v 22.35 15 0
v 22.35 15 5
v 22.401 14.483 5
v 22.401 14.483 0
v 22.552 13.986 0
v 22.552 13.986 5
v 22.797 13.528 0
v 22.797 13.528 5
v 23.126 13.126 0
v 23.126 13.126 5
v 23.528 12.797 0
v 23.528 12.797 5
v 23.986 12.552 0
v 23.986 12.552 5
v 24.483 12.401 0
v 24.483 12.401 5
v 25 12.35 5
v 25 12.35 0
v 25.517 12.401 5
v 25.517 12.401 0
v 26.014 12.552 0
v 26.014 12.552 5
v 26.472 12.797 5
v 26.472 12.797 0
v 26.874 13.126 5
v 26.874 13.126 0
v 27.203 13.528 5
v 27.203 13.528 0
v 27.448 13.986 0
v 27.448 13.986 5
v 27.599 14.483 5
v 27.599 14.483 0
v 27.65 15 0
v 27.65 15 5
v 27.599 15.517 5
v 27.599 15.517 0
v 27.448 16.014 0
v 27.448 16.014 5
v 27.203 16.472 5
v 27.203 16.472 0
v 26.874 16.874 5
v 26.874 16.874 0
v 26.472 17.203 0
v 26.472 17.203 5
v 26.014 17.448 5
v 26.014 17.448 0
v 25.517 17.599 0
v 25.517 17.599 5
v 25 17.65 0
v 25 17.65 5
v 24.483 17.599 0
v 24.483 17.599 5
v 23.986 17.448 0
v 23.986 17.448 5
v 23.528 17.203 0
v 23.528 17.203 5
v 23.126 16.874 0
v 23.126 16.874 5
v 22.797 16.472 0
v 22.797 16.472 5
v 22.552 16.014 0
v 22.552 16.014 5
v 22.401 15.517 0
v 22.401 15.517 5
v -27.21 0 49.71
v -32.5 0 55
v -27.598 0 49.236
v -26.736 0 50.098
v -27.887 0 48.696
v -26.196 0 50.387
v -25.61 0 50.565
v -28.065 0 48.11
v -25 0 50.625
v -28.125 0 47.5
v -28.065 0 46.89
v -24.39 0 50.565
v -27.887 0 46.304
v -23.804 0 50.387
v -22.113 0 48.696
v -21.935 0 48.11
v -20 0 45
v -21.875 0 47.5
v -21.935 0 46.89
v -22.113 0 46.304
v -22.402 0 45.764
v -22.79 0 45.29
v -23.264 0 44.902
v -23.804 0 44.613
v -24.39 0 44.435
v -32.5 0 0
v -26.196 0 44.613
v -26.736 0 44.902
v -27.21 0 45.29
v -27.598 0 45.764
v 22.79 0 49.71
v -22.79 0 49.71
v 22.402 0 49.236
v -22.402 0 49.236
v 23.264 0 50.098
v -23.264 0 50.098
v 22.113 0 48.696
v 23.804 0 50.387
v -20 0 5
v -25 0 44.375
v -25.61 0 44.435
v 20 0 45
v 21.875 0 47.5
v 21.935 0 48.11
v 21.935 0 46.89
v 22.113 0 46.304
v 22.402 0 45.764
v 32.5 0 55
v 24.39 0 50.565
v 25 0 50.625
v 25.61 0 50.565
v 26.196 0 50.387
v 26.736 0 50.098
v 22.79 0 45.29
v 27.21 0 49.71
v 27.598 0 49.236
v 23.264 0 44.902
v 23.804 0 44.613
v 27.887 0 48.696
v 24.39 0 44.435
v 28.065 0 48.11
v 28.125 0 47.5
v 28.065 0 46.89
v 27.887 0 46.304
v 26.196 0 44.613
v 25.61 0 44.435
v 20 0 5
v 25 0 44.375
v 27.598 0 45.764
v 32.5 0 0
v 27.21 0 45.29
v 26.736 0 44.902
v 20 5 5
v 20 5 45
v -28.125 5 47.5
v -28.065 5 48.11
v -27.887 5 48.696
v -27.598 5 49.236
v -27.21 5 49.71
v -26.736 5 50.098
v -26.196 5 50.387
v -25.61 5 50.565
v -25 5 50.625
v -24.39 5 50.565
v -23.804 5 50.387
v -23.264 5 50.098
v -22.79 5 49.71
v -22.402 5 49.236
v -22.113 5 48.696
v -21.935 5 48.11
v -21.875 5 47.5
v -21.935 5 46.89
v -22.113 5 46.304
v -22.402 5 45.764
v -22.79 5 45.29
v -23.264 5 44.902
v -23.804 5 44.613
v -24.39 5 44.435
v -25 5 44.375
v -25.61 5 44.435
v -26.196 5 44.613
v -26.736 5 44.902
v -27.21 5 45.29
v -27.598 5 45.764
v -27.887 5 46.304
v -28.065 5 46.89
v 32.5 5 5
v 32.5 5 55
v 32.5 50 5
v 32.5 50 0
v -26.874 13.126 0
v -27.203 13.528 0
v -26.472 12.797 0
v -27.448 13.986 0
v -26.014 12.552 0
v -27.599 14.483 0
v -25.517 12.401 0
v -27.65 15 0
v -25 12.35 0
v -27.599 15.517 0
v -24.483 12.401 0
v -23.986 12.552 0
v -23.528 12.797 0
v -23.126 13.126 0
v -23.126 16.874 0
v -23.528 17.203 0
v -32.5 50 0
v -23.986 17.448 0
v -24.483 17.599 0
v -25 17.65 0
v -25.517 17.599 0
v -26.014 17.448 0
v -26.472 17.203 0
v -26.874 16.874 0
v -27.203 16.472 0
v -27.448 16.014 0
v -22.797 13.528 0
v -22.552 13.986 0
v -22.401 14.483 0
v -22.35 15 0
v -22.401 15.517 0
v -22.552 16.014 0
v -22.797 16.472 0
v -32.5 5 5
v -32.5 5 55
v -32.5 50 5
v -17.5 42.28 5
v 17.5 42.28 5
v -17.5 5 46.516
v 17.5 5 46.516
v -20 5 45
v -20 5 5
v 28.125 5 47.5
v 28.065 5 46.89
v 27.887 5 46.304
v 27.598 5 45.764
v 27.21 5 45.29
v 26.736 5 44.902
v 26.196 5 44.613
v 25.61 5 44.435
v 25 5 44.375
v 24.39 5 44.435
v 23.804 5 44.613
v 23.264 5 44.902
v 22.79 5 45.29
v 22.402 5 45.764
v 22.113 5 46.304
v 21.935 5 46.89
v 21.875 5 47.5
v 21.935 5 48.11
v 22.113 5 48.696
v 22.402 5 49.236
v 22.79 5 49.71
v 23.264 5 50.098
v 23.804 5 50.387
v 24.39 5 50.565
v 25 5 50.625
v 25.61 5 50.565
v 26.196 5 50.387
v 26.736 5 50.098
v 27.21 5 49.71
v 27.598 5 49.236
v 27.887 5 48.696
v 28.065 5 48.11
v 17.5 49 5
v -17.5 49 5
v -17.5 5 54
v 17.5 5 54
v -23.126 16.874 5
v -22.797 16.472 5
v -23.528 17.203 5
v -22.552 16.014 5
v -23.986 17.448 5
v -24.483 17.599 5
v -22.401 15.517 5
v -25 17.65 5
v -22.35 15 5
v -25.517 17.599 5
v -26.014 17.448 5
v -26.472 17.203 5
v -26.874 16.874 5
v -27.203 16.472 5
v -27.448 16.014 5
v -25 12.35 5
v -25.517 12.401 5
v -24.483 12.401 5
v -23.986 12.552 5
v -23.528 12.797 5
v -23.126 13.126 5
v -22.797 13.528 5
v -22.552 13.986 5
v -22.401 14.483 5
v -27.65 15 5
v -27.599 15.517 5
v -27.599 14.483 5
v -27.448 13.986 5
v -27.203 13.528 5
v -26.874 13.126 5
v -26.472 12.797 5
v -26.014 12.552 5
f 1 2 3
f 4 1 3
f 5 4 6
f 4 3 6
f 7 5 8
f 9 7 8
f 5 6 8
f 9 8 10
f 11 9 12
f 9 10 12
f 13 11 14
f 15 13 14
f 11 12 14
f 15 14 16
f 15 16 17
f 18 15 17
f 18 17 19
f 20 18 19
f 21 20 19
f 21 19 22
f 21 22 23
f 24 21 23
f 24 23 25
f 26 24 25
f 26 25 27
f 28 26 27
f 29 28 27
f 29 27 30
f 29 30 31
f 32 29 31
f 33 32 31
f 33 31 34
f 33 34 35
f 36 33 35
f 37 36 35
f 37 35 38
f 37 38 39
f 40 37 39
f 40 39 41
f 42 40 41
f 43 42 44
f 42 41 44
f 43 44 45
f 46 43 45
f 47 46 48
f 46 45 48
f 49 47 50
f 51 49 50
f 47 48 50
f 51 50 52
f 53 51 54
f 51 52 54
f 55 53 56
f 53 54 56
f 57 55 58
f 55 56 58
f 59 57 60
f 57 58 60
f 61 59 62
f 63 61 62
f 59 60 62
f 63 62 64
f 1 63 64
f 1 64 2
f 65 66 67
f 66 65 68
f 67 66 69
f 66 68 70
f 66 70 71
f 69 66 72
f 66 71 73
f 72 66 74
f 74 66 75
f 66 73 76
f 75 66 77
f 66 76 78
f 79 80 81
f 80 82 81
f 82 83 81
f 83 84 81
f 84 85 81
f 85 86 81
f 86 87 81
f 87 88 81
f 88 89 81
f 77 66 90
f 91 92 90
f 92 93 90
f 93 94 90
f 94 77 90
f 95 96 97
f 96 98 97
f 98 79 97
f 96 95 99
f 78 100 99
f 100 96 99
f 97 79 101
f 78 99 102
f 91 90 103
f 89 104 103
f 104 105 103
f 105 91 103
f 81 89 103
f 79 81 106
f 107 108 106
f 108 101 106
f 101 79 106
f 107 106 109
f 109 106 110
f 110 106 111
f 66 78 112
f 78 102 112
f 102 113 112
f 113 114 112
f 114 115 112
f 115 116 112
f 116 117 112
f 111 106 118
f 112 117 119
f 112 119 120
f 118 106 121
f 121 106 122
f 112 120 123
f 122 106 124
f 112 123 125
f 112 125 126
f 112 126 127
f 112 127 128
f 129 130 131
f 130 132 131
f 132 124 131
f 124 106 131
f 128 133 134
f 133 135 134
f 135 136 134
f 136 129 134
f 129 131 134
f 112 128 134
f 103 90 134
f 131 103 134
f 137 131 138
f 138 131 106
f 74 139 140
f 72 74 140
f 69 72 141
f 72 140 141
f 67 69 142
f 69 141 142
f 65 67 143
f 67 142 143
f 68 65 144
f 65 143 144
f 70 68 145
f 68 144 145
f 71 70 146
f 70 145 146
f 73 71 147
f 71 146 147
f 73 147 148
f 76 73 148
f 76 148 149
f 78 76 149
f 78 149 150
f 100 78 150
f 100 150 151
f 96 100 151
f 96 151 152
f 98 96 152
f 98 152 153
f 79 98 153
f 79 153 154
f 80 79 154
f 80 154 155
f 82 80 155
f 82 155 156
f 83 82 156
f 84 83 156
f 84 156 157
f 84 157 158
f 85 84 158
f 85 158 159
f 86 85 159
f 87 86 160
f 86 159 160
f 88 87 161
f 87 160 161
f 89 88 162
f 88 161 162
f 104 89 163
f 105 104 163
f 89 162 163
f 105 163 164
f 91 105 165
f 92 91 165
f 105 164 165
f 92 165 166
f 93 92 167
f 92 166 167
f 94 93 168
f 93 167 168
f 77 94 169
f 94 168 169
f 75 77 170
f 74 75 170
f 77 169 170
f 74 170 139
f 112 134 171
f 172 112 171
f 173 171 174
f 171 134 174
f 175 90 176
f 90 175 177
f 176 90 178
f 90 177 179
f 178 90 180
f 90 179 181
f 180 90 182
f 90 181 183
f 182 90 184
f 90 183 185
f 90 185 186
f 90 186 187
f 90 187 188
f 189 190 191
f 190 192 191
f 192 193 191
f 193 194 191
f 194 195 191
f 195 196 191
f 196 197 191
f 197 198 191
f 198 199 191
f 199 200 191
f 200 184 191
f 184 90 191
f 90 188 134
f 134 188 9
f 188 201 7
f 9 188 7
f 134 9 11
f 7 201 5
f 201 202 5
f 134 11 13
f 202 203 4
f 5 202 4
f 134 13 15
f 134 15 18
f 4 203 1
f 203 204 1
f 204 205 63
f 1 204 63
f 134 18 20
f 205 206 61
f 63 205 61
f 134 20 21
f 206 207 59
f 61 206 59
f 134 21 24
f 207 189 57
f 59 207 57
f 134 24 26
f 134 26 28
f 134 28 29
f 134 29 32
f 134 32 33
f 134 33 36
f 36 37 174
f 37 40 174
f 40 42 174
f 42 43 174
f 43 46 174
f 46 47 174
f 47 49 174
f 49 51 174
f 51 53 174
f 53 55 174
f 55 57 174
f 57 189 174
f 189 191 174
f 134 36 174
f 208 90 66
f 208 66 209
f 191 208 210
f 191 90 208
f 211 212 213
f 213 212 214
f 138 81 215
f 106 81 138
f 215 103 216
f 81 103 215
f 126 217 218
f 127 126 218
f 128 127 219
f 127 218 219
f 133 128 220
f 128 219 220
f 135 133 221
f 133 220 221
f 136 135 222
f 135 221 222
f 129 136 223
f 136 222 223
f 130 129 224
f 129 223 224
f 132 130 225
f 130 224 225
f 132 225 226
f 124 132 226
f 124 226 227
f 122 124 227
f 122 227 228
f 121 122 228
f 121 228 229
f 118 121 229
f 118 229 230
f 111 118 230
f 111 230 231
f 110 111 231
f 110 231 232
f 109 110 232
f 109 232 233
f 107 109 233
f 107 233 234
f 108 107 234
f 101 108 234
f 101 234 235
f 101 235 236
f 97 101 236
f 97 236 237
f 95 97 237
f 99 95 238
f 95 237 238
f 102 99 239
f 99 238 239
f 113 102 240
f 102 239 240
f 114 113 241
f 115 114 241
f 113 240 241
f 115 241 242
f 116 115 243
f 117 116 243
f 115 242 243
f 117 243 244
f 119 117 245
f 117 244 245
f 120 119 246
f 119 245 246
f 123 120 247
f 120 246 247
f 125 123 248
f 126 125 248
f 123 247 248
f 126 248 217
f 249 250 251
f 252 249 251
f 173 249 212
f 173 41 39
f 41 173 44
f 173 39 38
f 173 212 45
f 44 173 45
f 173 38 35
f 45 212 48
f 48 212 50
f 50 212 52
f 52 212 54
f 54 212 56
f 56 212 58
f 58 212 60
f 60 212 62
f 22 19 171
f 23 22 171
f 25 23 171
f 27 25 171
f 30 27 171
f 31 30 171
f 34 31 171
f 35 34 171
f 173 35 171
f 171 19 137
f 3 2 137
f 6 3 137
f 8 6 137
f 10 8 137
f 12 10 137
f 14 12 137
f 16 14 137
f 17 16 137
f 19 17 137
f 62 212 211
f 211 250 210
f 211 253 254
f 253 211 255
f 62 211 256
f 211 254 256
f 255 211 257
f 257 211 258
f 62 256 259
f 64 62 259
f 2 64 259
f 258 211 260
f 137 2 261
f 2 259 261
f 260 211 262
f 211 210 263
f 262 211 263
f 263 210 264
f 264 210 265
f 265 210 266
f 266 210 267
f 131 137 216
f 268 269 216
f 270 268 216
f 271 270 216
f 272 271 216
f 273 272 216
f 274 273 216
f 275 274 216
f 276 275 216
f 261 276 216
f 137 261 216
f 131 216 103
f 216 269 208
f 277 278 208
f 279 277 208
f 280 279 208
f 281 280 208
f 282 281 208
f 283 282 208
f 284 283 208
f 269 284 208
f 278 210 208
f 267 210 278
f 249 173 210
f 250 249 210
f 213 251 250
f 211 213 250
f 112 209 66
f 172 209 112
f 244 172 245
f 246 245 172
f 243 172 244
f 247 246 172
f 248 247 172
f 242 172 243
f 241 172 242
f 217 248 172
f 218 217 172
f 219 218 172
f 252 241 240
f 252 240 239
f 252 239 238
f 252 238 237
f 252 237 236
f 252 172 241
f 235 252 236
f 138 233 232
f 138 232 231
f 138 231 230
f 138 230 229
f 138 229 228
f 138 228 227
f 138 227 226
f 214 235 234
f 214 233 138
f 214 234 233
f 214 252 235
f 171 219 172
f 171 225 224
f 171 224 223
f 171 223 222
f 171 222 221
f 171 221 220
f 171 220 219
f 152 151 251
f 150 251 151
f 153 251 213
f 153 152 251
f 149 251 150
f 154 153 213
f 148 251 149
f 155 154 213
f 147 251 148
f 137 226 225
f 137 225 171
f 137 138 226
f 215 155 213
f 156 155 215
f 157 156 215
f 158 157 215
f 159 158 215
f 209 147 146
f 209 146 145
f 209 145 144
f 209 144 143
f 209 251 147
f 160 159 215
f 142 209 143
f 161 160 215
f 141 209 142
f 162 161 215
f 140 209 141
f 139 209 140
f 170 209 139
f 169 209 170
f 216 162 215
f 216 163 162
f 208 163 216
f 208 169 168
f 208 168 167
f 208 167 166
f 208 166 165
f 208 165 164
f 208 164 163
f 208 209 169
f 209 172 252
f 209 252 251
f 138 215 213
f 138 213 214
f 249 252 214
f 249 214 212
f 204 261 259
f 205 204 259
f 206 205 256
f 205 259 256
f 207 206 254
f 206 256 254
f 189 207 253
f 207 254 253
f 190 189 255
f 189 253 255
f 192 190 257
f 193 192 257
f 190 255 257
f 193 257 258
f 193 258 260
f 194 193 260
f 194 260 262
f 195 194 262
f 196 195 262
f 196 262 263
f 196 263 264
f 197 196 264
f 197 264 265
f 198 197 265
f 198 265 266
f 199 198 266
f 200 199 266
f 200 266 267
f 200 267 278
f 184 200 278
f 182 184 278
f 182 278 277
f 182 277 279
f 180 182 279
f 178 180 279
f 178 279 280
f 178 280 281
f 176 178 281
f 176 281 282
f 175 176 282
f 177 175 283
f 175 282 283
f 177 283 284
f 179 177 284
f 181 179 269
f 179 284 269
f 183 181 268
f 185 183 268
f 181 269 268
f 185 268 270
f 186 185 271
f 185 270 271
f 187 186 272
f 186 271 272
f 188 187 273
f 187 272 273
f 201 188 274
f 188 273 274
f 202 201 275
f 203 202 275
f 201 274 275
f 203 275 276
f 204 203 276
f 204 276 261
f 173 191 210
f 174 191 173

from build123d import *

# Parameters (mm, degrees)
SKETCH1_W           = 65
SKETCH1_H           = 50
BOSS_EXTRUDE1_DEPTH = 5
SKETCH7_W           = 65
SKETCH7_H           = 50
BOSS_EXTRUDE5_DEPTH = 50
CUT_EXTRUDE4_DEPTH  = 99.742088291
SKETCH9_R           = 2.65
CUT_EXTRUDE5_DEPTH  = 78.821912081
SKETCH10_R          = 3.125
CUT_EXTRUDE6_DEPTH  = 79.14249804
CUT_EXTRUDE14_DEPTH = 15
CUT_EXTRUDE15_START = -65
CUT_EXTRUDE15_DEPTH = 15
CUT_EXTRUDE16_DEPTH = 99.742088291
CUT_EXTRUDE17_REACH = 83.125
SKETCH26_W          = 40
SKETCH26_H          = 40


with BuildPart() as part:
    # Sketch1 → Boss-Extrude1 (new body)
    with BuildSketch(Plane.XY):
        with Locations((0, 25)):
            Rectangle(SKETCH1_W, SKETCH1_H)
    extrude(amount=BOSS_EXTRUDE1_DEPTH)

    # Sketch7 → Boss-Extrude5 (add)
    with BuildSketch(Plane.XY.offset(5)):
        with Locations((0, 25)):
            Rectangle(SKETCH7_W, SKETCH7_H)
    extrude(amount=BOSS_EXTRUDE5_DEPTH)

    # Sketch8 → Cut-Extrude4 (cut, through all)
    with BuildSketch(Plane.ZY.offset(32.5)):
        Polygon((55, 50), (5, 50), (5, 49), (54, 5), (55, 5), align=None)
    extrude(amount=-CUT_EXTRUDE4_DEPTH, mode=Mode.SUBTRACT)

    # Sketch9 → Cut-Extrude5 (cut, through all)
    with BuildSketch(Plane.XY.offset(5)):
        with Locations((-25, 15)):
            Circle(SKETCH9_R)
        with Locations(Location((25, 15, 0), (0, 0, 180))):
            Circle(SKETCH9_R)
    extrude(amount=-CUT_EXTRUDE5_DEPTH, mode=Mode.SUBTRACT)

    # Sketch10 → Cut-Extrude6 (cut, through all)
    with BuildSketch(Plane(origin=(0, 5, 0), x_dir=(1, 0, 0), z_dir=(0, 1, 0))):
        with Locations(Location((-25, -47.5, 0), (0, 0, 180))):
            Circle(SKETCH10_R)
        with Locations((25, -47.5)):
            Circle(SKETCH10_R)
    extrude(amount=-CUT_EXTRUDE6_DEPTH, mode=Mode.SUBTRACT)

    # Sketch24 → Cut-Extrude14 (cut)
    with BuildSketch(Plane(origin=(32.5, 0, 0), x_dir=(0, 0, -1), z_dir=(1, 0, 0))):
        Polygon((-5, 49), (-54, 5), (-5, 5), align=None)
    extrude(amount=-CUT_EXTRUDE14_DEPTH, mode=Mode.SUBTRACT)

    # Sketch24<2> → Cut-Extrude15 (cut)
    with BuildSketch(Plane(origin=(32.5, 0, 0), x_dir=(0, 0, -1), z_dir=(1, 0, 0)).offset(CUT_EXTRUDE15_START)):
        Polygon((-5, 49), (-54, 5), (-5, 5), align=None)
    extrude(amount=CUT_EXTRUDE15_DEPTH, mode=Mode.SUBTRACT)

    # Sketch25 → Cut-Extrude16 (cut, through all)
    with BuildSketch(Plane(origin=(32.5, 0, 0), x_dir=(0, 0, -1), z_dir=(1, 0, 0))):
        Polygon((-5, 5), (-5, 42.280009867), (-46.516374625, 5), align=None)
    extrude(amount=-CUT_EXTRUDE16_DEPTH, mode=Mode.SUBTRACT)

    # Sketch26 → Cut-Extrude17 (cut, up to next)
    with BuildSketch(Plane.XZ, mode=Mode.PRIVATE) as cut_extrude17_sk1:
        with Locations((0, 25)):
            Rectangle(SKETCH26_W, SKETCH26_H)
    cut_extrude17_tool1 = extrude(cut_extrude17_sk1.sketch, amount=-CUT_EXTRUDE17_REACH, mode=Mode.PRIVATE) & part.part
    add(cut_extrude17_tool1.solids().sort_by_distance((0, 0, 25))[0], mode=Mode.SUBTRACT)


solid = part.part
